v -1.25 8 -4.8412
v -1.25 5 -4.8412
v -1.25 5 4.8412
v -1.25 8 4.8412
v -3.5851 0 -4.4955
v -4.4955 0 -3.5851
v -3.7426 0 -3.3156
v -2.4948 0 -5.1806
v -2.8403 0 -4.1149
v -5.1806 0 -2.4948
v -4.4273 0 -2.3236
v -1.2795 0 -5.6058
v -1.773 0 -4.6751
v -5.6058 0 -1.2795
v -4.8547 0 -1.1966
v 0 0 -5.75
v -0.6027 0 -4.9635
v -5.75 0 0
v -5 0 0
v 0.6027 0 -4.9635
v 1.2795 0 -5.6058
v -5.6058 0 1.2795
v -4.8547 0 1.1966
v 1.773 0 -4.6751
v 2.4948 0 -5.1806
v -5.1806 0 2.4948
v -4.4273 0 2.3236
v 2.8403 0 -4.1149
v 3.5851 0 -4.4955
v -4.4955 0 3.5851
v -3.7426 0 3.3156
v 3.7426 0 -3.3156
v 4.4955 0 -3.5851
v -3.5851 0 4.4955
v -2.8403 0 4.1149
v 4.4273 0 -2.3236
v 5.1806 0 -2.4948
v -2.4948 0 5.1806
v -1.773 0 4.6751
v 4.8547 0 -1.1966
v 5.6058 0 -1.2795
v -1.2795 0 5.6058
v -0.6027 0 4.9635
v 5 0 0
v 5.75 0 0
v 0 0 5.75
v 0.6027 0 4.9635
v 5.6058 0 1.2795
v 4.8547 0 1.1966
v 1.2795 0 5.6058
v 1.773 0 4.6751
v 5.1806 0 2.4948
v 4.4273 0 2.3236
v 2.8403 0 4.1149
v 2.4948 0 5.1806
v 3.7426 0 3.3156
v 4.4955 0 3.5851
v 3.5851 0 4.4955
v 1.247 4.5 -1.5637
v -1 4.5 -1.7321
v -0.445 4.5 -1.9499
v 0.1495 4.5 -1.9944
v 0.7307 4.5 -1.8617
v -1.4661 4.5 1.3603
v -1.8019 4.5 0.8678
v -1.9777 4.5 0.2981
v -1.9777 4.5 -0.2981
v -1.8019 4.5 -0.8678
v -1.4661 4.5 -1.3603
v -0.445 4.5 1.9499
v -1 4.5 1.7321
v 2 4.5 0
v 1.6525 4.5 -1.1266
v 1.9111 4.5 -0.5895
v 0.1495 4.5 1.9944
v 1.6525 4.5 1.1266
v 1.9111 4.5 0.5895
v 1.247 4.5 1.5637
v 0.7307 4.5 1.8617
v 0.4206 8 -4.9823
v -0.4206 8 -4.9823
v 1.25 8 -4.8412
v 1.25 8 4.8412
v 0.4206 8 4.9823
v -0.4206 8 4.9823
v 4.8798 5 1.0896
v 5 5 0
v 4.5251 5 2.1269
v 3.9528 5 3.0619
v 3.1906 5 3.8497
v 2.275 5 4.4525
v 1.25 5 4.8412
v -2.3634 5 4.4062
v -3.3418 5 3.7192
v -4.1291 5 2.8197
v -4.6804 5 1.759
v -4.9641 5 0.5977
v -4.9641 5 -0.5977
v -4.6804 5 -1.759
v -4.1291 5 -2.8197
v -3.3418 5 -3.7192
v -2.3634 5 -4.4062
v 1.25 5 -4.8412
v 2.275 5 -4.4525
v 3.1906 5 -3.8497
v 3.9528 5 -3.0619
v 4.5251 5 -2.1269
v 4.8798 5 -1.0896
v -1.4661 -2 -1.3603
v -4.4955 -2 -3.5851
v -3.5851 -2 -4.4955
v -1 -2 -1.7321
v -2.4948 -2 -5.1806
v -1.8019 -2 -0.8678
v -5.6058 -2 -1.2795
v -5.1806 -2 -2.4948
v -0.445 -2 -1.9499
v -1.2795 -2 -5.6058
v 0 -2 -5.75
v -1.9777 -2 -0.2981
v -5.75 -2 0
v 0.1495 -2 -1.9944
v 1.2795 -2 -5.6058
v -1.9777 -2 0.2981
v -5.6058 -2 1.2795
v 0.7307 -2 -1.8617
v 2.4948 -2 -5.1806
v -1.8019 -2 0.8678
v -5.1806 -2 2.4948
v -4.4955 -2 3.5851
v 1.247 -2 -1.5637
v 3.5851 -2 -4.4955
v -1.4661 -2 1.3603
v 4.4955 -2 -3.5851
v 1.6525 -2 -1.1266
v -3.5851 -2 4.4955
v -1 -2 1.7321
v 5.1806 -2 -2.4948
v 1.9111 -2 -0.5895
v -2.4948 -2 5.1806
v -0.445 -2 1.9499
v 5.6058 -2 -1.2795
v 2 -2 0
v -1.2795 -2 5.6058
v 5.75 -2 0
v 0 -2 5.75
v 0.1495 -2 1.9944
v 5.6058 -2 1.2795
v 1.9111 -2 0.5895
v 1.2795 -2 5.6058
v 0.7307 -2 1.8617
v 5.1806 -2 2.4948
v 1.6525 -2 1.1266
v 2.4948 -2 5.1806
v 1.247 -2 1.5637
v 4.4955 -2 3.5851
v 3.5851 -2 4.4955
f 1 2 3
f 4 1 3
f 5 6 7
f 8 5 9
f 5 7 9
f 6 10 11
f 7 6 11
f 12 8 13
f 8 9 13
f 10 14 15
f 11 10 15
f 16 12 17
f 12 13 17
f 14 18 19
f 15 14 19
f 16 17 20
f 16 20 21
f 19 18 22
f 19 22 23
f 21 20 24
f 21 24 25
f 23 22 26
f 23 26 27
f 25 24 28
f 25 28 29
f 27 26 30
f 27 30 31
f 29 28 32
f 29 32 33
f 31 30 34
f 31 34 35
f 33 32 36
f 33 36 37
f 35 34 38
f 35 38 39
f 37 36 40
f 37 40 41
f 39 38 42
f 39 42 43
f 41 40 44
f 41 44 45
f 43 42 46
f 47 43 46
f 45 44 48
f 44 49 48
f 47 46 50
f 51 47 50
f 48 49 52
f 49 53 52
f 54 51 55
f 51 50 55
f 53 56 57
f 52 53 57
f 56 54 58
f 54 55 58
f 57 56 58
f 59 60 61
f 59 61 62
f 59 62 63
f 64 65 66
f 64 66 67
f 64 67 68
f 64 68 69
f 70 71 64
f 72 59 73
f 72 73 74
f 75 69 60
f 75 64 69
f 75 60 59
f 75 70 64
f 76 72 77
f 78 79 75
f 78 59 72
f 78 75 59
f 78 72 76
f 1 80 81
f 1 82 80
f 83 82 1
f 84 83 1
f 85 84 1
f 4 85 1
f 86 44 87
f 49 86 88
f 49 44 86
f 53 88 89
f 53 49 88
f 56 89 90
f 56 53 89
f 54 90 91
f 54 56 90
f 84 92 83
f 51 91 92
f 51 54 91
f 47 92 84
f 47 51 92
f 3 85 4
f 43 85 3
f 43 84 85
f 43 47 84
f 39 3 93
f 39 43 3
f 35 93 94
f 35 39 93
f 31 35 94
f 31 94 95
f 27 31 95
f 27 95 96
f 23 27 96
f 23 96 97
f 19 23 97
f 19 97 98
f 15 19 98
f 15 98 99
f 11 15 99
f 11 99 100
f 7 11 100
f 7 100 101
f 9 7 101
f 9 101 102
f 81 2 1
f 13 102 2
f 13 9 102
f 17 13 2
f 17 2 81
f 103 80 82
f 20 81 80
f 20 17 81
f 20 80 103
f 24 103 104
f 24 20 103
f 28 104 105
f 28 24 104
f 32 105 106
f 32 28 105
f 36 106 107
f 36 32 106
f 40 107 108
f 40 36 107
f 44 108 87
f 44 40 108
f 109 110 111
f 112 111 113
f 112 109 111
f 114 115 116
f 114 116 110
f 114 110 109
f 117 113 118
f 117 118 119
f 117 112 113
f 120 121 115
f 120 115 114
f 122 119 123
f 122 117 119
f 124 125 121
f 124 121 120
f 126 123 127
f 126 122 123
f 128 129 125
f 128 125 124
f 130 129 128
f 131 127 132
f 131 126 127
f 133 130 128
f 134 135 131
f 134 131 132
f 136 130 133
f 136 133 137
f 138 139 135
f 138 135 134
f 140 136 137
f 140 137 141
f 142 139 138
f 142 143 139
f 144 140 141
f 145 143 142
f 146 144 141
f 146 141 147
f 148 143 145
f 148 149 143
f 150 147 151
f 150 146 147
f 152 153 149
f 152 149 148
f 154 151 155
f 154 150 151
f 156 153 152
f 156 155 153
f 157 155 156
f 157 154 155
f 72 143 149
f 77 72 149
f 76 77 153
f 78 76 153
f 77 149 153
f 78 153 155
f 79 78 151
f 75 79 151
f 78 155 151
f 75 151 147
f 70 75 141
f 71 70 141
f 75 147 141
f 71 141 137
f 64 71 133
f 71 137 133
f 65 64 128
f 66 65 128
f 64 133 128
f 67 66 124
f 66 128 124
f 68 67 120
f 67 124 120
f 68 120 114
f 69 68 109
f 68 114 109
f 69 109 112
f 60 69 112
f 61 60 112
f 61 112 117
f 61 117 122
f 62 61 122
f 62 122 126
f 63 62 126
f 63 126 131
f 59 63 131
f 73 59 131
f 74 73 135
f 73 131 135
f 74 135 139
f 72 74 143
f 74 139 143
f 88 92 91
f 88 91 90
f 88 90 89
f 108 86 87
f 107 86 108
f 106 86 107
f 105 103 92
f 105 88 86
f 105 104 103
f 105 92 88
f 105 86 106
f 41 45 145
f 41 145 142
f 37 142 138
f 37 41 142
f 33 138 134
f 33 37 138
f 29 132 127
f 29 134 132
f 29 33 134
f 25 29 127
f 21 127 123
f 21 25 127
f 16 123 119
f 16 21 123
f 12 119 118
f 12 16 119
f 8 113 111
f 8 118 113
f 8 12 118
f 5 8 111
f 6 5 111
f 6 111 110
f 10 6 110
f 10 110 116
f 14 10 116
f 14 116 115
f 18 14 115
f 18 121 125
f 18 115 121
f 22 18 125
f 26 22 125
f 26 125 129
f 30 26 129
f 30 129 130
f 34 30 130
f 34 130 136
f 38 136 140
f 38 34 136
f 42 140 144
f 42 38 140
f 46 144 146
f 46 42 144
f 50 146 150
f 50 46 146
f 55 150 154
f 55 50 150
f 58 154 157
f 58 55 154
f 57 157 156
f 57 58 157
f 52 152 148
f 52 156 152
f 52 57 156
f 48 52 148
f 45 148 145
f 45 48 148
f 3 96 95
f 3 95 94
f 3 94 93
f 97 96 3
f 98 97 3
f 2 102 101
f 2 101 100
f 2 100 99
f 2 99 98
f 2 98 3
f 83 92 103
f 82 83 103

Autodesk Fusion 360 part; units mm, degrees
sketch "Sketch1" plane through (0, 0, 0) normal (0, 1, 0) x (1, 0, 0)
  circle A0 centre (0, 0) radius 5
  dimension "d1" = 10
extrude "Extrude1" add sketch "Sketch1" along normal blind 5
sketch "Sketch2" plane through (0, 5, 0) normal (0, 1, 0) x (-1, 0, 0)
  circle A0 centre (0, 0) radius 5
  line L0 (-1.25, -5) -> (1.25, -5)
  line L1 (1.25, -5) -> (1.25, 5)
  line L2 (1.25, 5) -> (-1.25, 5)
  line L3 (-1.25, 5) -> (-1.25, -5)
  line L4 (-1.25, -5) -> (1.25, 5) construction
  line L5 (1.25, -5) -> (-1.25, 5) construction
  dimension "d4" = 2.5
  dimension "d5" = 10
extrude "Extrude2" add sketch "Sketch2" along normal blind 3 contours A0 L1 L3
sketch "Sketch3" plane through (0, 0, 0) normal (0, -1, 0) x (1, 0, 0)
  circle A0 centre (0, 0) radius 5
  circle A1 centre (0, 0) radius 5.75
  dimension "d8" = 11.5
extrude "Extrude3" add sketch "Sketch3" along normal blind 2 contours A0 | A1
sketch "Sketch5" plane through (0, -2, 0) normal (0, -1, 0) x (1, 0, 0)
  circle A0 centre (0, 0) radius 5.75
  circle A1 centre (0, 0) radius 2
  dimension "d11" = 4
extrude "Extrude4" cut sketch "Sketch5" against normal blind 6.5 contours A1
